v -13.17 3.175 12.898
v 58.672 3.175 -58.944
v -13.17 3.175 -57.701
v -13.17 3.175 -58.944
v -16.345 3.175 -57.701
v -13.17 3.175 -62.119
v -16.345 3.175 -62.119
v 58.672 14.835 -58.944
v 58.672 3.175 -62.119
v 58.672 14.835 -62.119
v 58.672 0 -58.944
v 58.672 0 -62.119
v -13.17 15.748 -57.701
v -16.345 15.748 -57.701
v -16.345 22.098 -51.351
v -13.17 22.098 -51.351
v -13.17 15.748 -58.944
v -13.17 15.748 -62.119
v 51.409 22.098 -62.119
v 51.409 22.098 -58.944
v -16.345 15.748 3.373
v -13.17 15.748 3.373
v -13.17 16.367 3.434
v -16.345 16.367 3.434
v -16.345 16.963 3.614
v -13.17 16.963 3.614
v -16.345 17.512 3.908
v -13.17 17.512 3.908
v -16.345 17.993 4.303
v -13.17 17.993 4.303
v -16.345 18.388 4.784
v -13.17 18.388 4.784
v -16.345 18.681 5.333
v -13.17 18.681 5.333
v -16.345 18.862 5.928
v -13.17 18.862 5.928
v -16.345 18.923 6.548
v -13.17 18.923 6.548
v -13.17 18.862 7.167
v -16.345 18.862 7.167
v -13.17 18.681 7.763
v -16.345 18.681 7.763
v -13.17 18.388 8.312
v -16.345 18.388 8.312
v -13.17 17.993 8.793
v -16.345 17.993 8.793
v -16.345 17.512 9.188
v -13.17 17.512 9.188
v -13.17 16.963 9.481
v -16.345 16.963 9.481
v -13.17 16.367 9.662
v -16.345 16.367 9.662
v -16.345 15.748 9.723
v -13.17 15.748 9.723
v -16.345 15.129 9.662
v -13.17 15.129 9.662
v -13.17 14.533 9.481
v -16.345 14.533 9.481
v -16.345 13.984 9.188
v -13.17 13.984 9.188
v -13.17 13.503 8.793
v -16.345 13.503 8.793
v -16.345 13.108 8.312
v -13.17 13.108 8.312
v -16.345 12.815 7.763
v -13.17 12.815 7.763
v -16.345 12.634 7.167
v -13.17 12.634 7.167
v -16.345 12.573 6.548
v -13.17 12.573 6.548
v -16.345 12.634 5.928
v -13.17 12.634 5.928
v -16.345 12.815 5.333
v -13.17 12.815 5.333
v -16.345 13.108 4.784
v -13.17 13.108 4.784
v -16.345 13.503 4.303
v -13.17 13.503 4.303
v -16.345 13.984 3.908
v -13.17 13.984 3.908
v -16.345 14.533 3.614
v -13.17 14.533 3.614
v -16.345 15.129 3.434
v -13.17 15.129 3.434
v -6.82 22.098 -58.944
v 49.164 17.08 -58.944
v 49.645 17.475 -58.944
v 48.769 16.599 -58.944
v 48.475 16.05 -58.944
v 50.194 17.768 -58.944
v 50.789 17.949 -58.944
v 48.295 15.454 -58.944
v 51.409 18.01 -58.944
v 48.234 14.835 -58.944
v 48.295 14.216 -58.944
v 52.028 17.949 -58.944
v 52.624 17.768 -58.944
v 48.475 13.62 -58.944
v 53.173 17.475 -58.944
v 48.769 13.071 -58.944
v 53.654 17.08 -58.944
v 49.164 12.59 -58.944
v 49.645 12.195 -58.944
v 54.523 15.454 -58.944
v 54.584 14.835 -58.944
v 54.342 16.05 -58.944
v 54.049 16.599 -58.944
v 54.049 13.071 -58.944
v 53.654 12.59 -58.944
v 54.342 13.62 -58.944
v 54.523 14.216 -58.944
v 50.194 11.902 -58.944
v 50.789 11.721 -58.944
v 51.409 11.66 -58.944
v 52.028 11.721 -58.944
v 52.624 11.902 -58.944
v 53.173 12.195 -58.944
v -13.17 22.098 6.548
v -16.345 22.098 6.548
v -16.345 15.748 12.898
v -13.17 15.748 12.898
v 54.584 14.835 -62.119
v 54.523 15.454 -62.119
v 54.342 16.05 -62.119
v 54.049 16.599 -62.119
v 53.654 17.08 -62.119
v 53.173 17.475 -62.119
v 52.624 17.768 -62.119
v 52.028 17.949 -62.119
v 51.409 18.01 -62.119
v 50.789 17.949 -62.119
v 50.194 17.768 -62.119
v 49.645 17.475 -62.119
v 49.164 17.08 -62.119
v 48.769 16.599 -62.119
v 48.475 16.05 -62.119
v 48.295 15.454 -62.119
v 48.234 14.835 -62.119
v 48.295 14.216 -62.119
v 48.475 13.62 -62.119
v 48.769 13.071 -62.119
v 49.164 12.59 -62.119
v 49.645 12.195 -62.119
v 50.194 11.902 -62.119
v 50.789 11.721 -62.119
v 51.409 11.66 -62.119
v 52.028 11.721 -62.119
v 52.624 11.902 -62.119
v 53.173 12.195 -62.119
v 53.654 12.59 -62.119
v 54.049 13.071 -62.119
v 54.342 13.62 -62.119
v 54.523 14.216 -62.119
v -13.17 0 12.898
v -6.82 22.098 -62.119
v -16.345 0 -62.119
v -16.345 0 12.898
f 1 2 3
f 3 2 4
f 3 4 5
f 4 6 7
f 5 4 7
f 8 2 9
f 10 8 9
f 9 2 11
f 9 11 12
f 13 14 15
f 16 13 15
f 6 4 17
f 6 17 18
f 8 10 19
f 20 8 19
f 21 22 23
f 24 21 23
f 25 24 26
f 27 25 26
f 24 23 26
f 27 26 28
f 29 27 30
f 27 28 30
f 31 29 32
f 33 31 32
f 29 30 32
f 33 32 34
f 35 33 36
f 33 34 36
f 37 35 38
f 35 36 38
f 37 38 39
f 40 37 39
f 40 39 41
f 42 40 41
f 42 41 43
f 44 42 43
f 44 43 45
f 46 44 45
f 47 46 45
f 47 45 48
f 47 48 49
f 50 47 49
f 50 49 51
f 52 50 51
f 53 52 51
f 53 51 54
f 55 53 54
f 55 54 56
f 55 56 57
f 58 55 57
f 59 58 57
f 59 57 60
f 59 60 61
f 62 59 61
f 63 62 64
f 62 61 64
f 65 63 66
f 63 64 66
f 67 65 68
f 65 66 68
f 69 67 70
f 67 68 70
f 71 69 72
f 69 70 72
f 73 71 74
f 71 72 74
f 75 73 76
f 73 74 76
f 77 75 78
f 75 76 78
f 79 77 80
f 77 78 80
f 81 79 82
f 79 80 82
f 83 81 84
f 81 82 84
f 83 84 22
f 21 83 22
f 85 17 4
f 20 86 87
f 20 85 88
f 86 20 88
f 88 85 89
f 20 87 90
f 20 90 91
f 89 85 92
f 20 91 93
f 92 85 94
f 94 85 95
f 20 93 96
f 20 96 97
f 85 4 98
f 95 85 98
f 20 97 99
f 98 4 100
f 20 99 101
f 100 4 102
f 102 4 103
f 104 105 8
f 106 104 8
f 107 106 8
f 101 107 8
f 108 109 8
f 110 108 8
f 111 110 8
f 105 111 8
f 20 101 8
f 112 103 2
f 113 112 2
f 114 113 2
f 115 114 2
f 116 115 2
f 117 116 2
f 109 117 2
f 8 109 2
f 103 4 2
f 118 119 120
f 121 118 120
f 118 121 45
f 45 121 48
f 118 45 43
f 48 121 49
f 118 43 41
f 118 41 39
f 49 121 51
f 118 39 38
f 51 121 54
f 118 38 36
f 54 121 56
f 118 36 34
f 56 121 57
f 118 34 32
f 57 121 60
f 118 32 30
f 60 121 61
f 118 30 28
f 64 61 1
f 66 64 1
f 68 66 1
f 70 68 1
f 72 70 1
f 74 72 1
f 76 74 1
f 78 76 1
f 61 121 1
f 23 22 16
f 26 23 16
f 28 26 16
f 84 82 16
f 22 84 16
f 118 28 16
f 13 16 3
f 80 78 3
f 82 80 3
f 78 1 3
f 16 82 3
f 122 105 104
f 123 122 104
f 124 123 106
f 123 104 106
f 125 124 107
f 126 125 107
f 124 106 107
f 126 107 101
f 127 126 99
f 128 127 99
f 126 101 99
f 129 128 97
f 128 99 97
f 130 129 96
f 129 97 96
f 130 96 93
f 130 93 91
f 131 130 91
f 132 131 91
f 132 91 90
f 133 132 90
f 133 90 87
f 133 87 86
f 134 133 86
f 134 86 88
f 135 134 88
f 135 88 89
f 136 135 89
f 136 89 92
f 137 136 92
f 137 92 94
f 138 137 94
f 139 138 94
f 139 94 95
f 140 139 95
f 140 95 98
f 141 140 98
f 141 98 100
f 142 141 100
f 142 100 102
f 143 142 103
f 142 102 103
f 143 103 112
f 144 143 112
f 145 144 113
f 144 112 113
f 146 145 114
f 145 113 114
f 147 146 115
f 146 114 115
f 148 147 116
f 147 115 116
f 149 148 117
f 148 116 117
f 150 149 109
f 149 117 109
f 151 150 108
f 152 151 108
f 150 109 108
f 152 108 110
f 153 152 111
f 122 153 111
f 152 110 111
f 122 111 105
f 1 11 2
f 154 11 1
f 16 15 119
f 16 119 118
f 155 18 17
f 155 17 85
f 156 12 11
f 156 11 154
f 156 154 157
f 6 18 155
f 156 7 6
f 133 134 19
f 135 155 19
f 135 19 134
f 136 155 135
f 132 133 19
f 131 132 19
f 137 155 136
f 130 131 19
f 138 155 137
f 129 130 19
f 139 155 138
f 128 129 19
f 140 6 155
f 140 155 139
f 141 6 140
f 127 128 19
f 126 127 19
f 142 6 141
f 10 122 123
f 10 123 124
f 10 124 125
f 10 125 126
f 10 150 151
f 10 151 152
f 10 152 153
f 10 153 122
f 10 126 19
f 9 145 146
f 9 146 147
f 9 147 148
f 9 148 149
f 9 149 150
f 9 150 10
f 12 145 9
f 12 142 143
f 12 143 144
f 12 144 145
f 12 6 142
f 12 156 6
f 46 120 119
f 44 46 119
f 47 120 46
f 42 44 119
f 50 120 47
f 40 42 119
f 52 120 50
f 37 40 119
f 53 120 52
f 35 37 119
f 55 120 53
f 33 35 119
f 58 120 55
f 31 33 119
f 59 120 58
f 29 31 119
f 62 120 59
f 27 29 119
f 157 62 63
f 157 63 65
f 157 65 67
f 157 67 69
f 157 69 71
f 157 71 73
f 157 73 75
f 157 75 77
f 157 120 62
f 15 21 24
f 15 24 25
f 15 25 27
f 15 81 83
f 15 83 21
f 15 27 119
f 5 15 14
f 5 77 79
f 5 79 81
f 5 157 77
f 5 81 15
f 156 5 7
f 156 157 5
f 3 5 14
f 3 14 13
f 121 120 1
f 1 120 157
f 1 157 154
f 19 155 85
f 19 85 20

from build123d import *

# Parameters (mm, degrees)
BOSS_EXTRUDE1_DEPTH = 3.175
SKETCH2_W           = 71.842048969
SKETCH2_H           = 3.175
BOSS_EXTRUDE2_DEPTH = 18.923
SKETCH3_W           = 3.175
SKETCH3_H           = 70.598963312
BOSS_EXTRUDE6_DEPTH = 18.923
CUT_EXTRUDE1_DEPTH  = 18.923
CUT_EXTRUDE2_DEPTH  = 18.923
SKETCH7_R           = 3.175
CUT_EXTRUDE3_DEPTH  = 18.923
SKETCH6_R           = 3.175
CUT_EXTRUDE4_DEPTH  = 18.923


with BuildPart() as part:
    # Sketch1 → Boss-Extrude1 (new body)
    with BuildSketch(Plane(origin=(0, 0, 0), x_dir=(1, 0, 0), z_dir=(0, 1, 0))):
        Polygon((-16.345355317, 62.119418011), (58.671693652, 62.119418011), (58.671693652, 58.944418011), (-13.170355317, -12.897630958), (-16.345355317, -12.897630958), align=None)
    extrude(amount=BOSS_EXTRUDE1_DEPTH)

    # Sketch2 → Boss-Extrude2 (add)
    with BuildSketch(Plane(origin=(0, 3.175, 0), x_dir=(1, 0, 0), z_dir=(0, 1, 0))):
        with Locations((22.750669167, 60.531918011)):
            Rectangle(SKETCH2_W, SKETCH2_H)
    extrude(amount=BOSS_EXTRUDE2_DEPTH)

    # Sketch3 → Boss-Extrude6 (add)
    with BuildSketch(Plane(origin=(0, 3.175, 0), x_dir=(1, 0, 0), z_dir=(0, 1, 0))):
        with Locations((-14.757855317, 22.401850698)):
            Rectangle(SKETCH3_W, SKETCH3_H)
    extrude(amount=BOSS_EXTRUDE6_DEPTH)

    # Sketch4 → Cut-Extrude1 (cut)
    with BuildSketch(Plane.ZY.offset(16.345355317)):
        Polygon((6.547630958, 22.098), (12.897630958, 15.748), (12.897630958, 22.098), align=None)
        Polygon((-57.701332354, 22.098), (-57.701332354, 15.748), (-51.351332354, 22.098), align=None)
    extrude(amount=-CUT_EXTRUDE1_DEPTH, mode=Mode.SUBTRACT)

    # Sketch5 → Cut-Extrude2 (cut)
    with BuildSketch(Plane(origin=(0, 0, -62.119418011), x_dir=(-1, 0, 0), z_dir=(0, 0, -1))):
        Polygon((13.170355317, 15.748), (6.820355317, 22.098), (13.170355317, 22.098), align=None)
        Polygon((-58.671693652, 14.834935127), (-51.408628779, 22.098), (-58.671693652, 22.098), align=None)
    extrude(amount=-CUT_EXTRUDE2_DEPTH, mode=Mode.SUBTRACT)

    # Sketch7 → Cut-Extrude3 (cut)
    with BuildSketch(Plane(origin=(-13.170355317, 0, 0), x_dir=(0, 0, -1), z_dir=(1, 0, 0))):
        with Locations((-6.547630958, 15.748)):
            Circle(SKETCH7_R)
    extrude(amount=-CUT_EXTRUDE3_DEPTH, mode=Mode.SUBTRACT)

    # Sketch6 → Cut-Extrude4 (cut)
    with BuildSketch(Plane.XY.offset(-58.944418011)):
        with Locations((51.408628779, 14.834935127)):
            Circle(SKETCH6_R)
    extrude(amount=-CUT_EXTRUDE4_DEPTH, mode=Mode.SUBTRACT)


solid = part.part
